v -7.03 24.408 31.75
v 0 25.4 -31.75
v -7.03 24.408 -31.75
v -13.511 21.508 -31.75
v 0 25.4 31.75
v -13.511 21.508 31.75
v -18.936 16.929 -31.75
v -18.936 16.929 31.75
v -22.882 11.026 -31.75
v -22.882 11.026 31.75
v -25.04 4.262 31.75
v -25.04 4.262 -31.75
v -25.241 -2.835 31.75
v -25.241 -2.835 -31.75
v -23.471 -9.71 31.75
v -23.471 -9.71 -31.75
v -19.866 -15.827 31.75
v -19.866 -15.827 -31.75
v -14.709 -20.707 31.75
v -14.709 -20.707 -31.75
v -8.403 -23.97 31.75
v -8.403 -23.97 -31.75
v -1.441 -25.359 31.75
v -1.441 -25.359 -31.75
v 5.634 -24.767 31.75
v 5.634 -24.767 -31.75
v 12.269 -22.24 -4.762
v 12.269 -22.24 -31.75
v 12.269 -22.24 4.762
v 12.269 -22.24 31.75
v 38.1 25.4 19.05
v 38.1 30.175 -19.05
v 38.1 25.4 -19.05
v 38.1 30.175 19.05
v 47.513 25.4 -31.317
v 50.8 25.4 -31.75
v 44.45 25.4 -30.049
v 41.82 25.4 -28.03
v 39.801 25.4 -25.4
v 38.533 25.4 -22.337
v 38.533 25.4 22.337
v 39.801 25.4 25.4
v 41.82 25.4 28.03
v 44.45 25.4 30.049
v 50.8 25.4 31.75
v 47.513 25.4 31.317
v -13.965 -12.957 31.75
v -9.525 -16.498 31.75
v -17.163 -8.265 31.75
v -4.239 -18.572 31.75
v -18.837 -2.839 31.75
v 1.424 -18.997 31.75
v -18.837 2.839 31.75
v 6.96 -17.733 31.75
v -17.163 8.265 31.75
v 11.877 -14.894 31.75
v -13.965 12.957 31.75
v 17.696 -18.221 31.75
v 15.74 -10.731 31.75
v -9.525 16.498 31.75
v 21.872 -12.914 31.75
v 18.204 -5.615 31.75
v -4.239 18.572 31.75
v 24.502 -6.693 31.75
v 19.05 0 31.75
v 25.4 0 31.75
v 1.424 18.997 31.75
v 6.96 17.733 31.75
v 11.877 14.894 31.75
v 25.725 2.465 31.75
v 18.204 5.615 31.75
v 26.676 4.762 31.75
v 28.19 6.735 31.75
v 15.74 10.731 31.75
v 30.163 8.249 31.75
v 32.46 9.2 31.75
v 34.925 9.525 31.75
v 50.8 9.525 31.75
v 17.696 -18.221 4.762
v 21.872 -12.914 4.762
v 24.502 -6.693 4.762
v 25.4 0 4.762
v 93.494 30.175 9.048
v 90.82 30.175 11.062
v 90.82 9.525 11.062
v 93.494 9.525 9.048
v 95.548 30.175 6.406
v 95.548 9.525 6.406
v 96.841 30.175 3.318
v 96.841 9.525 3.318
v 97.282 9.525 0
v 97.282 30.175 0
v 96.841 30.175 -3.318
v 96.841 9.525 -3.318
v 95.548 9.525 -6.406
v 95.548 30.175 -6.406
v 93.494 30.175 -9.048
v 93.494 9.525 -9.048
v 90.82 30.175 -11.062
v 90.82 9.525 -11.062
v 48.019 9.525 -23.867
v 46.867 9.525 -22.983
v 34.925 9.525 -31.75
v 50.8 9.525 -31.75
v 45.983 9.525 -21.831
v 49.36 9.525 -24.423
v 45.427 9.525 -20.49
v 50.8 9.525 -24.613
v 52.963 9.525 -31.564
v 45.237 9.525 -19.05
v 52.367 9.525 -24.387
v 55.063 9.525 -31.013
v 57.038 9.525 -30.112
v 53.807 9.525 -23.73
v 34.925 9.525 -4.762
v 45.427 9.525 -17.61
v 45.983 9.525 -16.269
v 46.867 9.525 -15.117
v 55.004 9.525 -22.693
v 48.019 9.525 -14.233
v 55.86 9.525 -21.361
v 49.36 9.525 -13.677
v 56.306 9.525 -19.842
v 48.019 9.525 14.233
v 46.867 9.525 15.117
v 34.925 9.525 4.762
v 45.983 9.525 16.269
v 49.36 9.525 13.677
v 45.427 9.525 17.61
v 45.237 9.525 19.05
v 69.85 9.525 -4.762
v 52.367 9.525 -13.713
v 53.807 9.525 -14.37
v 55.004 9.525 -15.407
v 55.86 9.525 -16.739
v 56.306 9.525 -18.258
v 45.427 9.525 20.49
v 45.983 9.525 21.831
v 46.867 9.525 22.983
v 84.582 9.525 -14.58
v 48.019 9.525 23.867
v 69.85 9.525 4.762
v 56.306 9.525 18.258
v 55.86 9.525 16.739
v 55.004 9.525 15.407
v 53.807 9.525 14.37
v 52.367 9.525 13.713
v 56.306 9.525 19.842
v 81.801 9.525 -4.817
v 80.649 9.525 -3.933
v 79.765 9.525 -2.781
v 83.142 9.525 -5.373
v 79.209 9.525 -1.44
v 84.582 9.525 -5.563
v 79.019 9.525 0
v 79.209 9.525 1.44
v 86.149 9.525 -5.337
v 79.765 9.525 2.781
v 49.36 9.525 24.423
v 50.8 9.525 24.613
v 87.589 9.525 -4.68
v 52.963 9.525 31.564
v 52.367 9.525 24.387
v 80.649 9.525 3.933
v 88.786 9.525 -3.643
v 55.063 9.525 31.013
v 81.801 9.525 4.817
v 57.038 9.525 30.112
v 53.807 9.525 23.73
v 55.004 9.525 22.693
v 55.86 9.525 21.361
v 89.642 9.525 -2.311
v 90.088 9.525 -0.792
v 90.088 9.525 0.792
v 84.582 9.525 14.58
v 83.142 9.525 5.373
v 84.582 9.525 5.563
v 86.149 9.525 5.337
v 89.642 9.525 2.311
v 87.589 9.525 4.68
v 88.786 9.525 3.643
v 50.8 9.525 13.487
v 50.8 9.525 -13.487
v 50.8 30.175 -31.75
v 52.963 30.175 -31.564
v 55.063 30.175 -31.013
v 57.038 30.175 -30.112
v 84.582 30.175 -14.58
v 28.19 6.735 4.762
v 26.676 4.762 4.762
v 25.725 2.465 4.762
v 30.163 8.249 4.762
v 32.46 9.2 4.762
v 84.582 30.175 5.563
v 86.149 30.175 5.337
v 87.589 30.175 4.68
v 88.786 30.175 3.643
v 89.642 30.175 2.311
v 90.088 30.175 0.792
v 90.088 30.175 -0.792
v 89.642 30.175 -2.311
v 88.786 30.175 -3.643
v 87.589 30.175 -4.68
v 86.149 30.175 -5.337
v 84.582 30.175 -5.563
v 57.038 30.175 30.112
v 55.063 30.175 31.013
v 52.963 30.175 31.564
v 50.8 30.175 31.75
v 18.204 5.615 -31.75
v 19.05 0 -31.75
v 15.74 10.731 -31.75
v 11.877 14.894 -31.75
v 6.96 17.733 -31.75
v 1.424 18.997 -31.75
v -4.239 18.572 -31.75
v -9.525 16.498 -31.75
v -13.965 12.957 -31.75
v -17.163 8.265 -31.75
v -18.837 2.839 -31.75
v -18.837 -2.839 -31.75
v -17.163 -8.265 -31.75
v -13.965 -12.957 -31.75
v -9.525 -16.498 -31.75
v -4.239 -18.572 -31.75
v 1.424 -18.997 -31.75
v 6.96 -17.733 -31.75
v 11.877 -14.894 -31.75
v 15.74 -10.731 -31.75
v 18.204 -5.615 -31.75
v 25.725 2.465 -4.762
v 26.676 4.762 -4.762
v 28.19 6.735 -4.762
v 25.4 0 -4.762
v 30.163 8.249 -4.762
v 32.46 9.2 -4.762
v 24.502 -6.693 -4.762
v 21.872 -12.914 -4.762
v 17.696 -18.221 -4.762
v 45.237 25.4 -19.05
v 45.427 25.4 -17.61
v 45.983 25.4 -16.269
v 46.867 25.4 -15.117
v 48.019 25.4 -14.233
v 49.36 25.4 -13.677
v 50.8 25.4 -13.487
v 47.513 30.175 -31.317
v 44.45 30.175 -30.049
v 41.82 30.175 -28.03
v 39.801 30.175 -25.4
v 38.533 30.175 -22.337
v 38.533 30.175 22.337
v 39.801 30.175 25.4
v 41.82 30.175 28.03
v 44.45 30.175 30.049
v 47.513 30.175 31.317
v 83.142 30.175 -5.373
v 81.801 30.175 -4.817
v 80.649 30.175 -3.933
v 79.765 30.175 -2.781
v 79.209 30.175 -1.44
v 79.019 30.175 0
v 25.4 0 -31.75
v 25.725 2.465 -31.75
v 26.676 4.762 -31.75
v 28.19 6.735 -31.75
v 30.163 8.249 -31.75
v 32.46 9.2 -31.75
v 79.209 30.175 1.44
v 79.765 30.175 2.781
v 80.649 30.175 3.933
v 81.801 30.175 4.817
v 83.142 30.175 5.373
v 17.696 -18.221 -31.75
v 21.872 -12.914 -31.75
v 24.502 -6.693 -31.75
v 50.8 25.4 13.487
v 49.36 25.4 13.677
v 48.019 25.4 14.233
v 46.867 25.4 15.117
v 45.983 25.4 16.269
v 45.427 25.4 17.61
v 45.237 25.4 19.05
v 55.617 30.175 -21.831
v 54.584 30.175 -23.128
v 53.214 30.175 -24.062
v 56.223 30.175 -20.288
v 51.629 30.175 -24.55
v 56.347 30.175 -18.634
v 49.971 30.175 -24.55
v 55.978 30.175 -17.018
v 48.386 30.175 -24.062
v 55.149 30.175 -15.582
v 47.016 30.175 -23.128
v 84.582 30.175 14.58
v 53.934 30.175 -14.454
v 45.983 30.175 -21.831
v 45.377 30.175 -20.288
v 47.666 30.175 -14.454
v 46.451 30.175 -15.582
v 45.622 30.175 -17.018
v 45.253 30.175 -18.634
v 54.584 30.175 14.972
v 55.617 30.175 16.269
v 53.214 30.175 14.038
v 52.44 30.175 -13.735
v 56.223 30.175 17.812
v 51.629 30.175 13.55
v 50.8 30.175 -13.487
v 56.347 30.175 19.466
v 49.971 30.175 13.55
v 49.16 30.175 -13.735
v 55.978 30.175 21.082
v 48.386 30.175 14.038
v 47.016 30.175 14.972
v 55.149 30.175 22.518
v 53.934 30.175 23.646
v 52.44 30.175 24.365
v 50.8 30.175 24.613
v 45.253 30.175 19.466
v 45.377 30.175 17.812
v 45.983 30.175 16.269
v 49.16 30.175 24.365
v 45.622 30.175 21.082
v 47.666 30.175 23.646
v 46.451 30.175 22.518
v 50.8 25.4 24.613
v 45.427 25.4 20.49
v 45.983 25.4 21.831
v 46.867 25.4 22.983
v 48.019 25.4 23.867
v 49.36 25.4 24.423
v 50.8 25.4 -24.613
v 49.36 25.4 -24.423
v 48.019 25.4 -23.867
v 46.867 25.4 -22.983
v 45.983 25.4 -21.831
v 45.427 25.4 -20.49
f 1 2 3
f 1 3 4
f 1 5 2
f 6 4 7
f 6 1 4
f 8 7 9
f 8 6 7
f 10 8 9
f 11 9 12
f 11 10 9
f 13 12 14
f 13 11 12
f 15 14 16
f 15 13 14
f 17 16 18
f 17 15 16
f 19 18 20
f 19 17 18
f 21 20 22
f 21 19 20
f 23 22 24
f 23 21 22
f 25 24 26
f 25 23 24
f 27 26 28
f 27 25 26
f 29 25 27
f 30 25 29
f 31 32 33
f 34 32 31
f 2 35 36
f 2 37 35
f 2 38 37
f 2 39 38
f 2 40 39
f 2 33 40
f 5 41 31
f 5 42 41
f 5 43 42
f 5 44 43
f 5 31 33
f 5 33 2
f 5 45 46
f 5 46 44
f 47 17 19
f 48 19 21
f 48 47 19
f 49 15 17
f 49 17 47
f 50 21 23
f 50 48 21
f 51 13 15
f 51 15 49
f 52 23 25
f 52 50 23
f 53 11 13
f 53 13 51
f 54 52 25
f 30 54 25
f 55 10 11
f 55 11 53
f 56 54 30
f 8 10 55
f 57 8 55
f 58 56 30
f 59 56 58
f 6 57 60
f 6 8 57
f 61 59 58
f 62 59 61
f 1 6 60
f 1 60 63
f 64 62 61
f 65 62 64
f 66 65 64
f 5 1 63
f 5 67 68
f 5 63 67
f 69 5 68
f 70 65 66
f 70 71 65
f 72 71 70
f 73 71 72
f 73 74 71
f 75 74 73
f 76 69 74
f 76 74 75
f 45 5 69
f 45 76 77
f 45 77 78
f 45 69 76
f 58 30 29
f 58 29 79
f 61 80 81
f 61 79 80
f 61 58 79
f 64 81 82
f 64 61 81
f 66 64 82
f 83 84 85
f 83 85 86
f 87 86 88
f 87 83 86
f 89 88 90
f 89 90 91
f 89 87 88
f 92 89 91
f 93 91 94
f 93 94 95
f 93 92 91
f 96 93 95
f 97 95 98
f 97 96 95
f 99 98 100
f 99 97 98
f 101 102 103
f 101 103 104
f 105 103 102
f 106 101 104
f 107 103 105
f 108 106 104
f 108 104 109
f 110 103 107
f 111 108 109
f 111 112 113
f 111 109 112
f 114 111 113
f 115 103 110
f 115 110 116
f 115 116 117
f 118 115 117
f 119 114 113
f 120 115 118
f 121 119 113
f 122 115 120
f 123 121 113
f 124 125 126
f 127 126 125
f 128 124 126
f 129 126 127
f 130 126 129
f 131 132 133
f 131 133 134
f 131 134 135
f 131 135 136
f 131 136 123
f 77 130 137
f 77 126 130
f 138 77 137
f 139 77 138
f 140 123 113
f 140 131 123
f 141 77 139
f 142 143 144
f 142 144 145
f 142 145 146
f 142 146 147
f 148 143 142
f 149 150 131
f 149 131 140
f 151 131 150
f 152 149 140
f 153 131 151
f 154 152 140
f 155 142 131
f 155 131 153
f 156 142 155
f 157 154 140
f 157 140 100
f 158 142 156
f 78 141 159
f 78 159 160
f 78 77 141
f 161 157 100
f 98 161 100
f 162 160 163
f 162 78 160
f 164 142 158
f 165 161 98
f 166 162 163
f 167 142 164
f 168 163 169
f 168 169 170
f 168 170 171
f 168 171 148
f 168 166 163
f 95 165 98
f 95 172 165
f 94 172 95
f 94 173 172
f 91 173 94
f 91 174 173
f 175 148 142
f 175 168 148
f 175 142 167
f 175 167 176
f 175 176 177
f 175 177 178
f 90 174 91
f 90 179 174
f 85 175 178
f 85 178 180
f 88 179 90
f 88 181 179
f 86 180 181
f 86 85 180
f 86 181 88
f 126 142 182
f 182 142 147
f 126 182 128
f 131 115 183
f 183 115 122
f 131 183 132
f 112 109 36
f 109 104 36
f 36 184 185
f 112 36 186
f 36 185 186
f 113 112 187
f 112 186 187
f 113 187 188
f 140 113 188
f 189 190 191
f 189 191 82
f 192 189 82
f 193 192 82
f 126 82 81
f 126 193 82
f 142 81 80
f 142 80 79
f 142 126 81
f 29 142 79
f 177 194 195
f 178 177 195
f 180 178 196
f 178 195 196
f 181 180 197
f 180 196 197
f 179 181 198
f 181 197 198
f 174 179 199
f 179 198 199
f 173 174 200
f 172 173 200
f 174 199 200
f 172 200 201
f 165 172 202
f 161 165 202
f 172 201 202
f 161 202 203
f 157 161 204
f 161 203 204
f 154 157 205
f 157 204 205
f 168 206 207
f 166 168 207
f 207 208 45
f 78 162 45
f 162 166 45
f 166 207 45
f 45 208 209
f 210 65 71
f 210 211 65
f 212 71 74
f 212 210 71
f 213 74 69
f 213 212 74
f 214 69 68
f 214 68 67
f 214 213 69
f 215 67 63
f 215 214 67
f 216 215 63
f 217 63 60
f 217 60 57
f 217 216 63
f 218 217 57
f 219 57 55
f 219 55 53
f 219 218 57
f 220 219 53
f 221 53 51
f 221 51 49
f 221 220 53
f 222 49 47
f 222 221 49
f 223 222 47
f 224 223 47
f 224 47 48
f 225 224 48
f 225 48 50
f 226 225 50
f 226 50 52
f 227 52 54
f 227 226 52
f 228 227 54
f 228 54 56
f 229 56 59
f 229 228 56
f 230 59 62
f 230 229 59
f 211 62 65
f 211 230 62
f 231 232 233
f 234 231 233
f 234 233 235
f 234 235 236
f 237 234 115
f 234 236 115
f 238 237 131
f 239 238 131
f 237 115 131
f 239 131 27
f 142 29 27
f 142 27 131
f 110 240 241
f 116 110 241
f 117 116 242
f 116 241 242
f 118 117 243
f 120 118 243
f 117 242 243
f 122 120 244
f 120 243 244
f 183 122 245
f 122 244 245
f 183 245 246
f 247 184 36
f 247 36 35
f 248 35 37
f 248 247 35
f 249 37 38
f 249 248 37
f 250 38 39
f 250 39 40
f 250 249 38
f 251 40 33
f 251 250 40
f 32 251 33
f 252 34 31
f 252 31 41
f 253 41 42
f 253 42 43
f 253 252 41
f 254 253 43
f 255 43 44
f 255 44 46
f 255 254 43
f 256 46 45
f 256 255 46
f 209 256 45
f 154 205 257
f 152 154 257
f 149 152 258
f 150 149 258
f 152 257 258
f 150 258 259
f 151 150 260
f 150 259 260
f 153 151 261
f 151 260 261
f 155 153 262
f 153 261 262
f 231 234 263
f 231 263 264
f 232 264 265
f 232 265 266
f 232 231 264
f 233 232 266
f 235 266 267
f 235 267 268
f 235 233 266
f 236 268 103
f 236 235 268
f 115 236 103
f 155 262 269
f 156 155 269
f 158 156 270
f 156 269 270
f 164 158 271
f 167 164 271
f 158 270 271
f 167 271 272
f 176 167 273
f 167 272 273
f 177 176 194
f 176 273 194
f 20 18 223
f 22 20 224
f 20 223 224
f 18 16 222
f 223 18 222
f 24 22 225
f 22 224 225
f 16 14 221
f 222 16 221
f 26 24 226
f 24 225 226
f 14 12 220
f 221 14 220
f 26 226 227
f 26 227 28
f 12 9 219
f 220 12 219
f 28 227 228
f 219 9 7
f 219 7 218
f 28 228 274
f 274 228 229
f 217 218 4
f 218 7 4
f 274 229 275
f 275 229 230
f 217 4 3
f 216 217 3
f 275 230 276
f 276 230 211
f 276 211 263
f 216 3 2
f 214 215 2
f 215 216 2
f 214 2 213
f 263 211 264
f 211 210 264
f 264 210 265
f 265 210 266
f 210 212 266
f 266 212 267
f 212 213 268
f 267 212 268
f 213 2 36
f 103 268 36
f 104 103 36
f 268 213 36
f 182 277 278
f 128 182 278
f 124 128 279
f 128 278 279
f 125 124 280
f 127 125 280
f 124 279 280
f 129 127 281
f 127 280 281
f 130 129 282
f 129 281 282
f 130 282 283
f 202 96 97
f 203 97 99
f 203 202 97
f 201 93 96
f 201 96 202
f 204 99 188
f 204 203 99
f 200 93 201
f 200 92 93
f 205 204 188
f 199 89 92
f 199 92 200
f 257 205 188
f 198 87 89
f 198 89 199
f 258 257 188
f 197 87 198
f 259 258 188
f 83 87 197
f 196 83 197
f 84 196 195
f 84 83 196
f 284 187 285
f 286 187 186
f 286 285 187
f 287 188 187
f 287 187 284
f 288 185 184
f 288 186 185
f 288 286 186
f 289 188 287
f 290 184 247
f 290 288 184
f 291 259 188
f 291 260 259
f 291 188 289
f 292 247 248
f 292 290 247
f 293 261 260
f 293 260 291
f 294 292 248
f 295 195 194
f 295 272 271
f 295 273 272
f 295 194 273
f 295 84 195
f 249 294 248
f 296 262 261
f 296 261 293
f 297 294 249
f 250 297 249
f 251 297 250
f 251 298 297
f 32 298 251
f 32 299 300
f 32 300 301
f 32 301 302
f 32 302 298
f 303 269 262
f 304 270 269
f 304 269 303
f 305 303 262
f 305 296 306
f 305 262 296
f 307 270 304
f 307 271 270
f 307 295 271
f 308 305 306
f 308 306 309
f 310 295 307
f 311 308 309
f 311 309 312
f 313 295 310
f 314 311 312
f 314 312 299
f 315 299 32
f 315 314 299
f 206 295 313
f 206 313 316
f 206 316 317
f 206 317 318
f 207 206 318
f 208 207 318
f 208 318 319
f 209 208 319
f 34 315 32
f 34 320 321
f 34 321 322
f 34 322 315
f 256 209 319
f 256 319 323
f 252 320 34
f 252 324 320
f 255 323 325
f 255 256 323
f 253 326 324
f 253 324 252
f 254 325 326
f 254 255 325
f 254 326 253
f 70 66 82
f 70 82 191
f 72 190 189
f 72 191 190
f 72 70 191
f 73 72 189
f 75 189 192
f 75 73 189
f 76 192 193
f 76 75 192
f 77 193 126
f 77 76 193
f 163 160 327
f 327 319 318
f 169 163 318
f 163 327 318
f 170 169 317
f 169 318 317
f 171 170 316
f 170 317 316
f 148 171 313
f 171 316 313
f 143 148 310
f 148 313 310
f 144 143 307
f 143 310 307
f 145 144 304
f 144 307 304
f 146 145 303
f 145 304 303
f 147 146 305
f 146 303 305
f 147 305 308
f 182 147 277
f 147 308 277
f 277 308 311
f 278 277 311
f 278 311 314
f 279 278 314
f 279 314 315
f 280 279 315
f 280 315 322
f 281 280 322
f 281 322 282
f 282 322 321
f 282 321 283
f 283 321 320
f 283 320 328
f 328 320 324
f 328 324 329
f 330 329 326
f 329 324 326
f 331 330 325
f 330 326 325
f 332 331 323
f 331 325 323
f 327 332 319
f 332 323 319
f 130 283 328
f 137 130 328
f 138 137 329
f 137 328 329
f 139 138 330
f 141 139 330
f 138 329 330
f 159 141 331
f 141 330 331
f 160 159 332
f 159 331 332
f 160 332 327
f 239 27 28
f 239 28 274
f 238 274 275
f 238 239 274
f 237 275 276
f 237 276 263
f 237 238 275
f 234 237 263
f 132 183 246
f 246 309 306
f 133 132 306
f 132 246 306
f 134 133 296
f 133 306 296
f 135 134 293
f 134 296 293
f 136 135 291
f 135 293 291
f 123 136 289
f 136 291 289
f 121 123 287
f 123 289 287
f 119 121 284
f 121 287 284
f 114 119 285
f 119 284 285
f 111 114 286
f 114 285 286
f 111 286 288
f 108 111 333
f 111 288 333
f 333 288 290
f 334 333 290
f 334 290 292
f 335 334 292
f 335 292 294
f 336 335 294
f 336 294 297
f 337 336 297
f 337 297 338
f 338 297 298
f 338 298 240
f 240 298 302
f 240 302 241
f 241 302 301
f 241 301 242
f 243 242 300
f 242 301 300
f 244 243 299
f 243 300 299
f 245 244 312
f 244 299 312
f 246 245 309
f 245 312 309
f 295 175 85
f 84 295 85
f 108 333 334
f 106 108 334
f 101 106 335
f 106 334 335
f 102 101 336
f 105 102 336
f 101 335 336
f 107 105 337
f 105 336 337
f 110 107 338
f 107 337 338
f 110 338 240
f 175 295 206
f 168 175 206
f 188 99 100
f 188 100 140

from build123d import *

# Parameters (mm, degrees)
F0_R     = 19.05
F1_DEPTH = 31.75
F2_DEPTH = 4.7625
F4_R     = 5.5626
F5_DEPTH = 20.6502
F6_DEPTH = 55.5762


with BuildPart() as f1:
    # F0 (on Top) → F1 (new body, symmetric)
    with BuildSketch(Plane.XY):
        with BuildLine():
            ThreePointArc((12.269125, -22.240247), (21.872309, -12.913641), (25.4, 0))
            ThreePointArc((25.4, 0), (28.189808, 6.735192), (34.925, 9.525))
            Line((34.925, 9.525), (69.85, 9.525))
            Line((69.85, 9.525), (84.582, 9.525))
            Line((84.582, 9.525), (84.582, 30.1752))
            Line((84.582, 30.1752), (50.8, 30.1752))
            Line((50.8, 30.1752), (50.8, 25.4))
            Line((50.8, 25.4), (0, 25.4))
            ThreePointArc((0, 25.4), (-24.597381, -6.334735), (12.269125, -22.240247))
        make_face()
        Circle(F0_R, mode=Mode.SUBTRACT)
    extrude(amount=F1_DEPTH, both=True)

    # F0 (on Top) → F2 (join, symmetric)
    with BuildSketch(Plane.XY):
        with BuildLine():
            ThreePointArc((34.925, 9.525), (28.189808, 6.735192), (25.4, 0))
            ThreePointArc((25.4, 0), (21.872309, -12.913641), (12.269125, -22.240247))
            Line((12.269125, -22.240247), (69.85, 9.525))
            Line((69.85, 9.525), (34.925, 9.525))
        make_face()
    extrude(amount=F2_DEPTH, both=True)

    # F4 (on face) → F5 (join)
    with BuildSketch(Plane(origin=(0, 30.1752, 0), x_dir=(-1, 0, 0), z_dir=(0, 1, 0))):
        with BuildLine():
            Line((-38.1, -19.05), (-38.1, 19.05))
            ThreePointArc((-38.1, 19.05), (-44.394325, 30.01619), (-57.038161, 30.112339))
            Line((-57.038161, 30.112339), (-90.820161, 11.062339))
            ThreePointArc((-90.820161, 11.062339), (-97.282, 0), (-90.820161, -11.062339))
            Line((-90.820161, -11.062339), (-57.038161, -30.112339))
            ThreePointArc((-57.038161, -30.112339), (-44.394325, -30.01619), (-38.1, -19.05))
        make_face()
        with Locations((-50.8, -19.05)):
            Circle(F4_R, mode=Mode.SUBTRACT)
        with Locations((-84.582, 0)):
            Circle(F4_R, mode=Mode.SUBTRACT)
        with Locations((-50.8, 19.05)):
            Circle(F4_R, mode=Mode.SUBTRACT)
    extrude(amount=-F5_DEPTH)

    # F4 (on face) → F6 (cut, through all)
    with BuildSketch(Plane(origin=(0, 30.1752, 0), x_dir=(-1, 0, 0), z_dir=(0, 1, 0))):
        with BuildLine():
            ThreePointArc((-45.2374, -19.05), (-46.866648, -15.116648), (-50.8, -13.4874))
            Line((-50.8, -13.4874), (-50.8, -24.6126))
            ThreePointArc((-50.8, -24.6126), (-46.866648, -22.983352), (-45.2374, -19.05))
        make_face()
        with BuildLine():
            Line((-50.8, 13.4874), (-50.8, 24.6126))
            ThreePointArc((-50.8, 24.6126), (-56.3626, 19.05), (-50.8, 13.4874))
        make_face()
        with BuildLine():
            ThreePointArc((-79.0194, 0), (-80.648648, 3.933352), (-84.582, 5.5626))
            Line((-84.582, 5.5626), (-84.582, -5.5626))
            ThreePointArc((-84.582, -5.5626), (-80.648648, -3.933352), (-79.0194, 0))
        make_face()
        with BuildLine():
            ThreePointArc((-50.8, 13.4874), (-46.866648, 15.116648), (-45.2374, 19.05))
            ThreePointArc((-45.2374, 19.05), (-46.866648, 22.983352), (-50.8, 24.6126))
            Line((-50.8, 24.6126), (-50.8, 13.4874))
        make_face()
        with BuildLine():
            Line((-50.8, -24.6126), (-50.8, -13.4874))
            ThreePointArc((-50.8, -13.4874), (-56.3626, -19.05), (-50.8, -24.6126))
        make_face()
        with BuildLine():
            ThreePointArc((-57.038161, 30.112339), (-54.024771, 31.333764), (-50.8, 31.75))
            Line((-50.8, 31.75), (-84.582, 31.75))
            Line((-84.582, 31.75), (-84.582, 14.580099))
            Line((-84.582, 14.580099), (-57.038161, 30.112339))
        make_face()
        with BuildLine():
            Line((-84.582, -31.75), (-50.8, -31.75))
            ThreePointArc((-50.8, -31.75), (-54.024771, -31.333764), (-57.038161, -30.112339))
            Line((-57.038161, -30.112339), (-84.582, -14.580099))
            Line((-84.582, -14.580099), (-84.582, -31.75))
        make_face()
    extrude(amount=-F6_DEPTH, mode=Mode.SUBTRACT)


solid = f1.part
